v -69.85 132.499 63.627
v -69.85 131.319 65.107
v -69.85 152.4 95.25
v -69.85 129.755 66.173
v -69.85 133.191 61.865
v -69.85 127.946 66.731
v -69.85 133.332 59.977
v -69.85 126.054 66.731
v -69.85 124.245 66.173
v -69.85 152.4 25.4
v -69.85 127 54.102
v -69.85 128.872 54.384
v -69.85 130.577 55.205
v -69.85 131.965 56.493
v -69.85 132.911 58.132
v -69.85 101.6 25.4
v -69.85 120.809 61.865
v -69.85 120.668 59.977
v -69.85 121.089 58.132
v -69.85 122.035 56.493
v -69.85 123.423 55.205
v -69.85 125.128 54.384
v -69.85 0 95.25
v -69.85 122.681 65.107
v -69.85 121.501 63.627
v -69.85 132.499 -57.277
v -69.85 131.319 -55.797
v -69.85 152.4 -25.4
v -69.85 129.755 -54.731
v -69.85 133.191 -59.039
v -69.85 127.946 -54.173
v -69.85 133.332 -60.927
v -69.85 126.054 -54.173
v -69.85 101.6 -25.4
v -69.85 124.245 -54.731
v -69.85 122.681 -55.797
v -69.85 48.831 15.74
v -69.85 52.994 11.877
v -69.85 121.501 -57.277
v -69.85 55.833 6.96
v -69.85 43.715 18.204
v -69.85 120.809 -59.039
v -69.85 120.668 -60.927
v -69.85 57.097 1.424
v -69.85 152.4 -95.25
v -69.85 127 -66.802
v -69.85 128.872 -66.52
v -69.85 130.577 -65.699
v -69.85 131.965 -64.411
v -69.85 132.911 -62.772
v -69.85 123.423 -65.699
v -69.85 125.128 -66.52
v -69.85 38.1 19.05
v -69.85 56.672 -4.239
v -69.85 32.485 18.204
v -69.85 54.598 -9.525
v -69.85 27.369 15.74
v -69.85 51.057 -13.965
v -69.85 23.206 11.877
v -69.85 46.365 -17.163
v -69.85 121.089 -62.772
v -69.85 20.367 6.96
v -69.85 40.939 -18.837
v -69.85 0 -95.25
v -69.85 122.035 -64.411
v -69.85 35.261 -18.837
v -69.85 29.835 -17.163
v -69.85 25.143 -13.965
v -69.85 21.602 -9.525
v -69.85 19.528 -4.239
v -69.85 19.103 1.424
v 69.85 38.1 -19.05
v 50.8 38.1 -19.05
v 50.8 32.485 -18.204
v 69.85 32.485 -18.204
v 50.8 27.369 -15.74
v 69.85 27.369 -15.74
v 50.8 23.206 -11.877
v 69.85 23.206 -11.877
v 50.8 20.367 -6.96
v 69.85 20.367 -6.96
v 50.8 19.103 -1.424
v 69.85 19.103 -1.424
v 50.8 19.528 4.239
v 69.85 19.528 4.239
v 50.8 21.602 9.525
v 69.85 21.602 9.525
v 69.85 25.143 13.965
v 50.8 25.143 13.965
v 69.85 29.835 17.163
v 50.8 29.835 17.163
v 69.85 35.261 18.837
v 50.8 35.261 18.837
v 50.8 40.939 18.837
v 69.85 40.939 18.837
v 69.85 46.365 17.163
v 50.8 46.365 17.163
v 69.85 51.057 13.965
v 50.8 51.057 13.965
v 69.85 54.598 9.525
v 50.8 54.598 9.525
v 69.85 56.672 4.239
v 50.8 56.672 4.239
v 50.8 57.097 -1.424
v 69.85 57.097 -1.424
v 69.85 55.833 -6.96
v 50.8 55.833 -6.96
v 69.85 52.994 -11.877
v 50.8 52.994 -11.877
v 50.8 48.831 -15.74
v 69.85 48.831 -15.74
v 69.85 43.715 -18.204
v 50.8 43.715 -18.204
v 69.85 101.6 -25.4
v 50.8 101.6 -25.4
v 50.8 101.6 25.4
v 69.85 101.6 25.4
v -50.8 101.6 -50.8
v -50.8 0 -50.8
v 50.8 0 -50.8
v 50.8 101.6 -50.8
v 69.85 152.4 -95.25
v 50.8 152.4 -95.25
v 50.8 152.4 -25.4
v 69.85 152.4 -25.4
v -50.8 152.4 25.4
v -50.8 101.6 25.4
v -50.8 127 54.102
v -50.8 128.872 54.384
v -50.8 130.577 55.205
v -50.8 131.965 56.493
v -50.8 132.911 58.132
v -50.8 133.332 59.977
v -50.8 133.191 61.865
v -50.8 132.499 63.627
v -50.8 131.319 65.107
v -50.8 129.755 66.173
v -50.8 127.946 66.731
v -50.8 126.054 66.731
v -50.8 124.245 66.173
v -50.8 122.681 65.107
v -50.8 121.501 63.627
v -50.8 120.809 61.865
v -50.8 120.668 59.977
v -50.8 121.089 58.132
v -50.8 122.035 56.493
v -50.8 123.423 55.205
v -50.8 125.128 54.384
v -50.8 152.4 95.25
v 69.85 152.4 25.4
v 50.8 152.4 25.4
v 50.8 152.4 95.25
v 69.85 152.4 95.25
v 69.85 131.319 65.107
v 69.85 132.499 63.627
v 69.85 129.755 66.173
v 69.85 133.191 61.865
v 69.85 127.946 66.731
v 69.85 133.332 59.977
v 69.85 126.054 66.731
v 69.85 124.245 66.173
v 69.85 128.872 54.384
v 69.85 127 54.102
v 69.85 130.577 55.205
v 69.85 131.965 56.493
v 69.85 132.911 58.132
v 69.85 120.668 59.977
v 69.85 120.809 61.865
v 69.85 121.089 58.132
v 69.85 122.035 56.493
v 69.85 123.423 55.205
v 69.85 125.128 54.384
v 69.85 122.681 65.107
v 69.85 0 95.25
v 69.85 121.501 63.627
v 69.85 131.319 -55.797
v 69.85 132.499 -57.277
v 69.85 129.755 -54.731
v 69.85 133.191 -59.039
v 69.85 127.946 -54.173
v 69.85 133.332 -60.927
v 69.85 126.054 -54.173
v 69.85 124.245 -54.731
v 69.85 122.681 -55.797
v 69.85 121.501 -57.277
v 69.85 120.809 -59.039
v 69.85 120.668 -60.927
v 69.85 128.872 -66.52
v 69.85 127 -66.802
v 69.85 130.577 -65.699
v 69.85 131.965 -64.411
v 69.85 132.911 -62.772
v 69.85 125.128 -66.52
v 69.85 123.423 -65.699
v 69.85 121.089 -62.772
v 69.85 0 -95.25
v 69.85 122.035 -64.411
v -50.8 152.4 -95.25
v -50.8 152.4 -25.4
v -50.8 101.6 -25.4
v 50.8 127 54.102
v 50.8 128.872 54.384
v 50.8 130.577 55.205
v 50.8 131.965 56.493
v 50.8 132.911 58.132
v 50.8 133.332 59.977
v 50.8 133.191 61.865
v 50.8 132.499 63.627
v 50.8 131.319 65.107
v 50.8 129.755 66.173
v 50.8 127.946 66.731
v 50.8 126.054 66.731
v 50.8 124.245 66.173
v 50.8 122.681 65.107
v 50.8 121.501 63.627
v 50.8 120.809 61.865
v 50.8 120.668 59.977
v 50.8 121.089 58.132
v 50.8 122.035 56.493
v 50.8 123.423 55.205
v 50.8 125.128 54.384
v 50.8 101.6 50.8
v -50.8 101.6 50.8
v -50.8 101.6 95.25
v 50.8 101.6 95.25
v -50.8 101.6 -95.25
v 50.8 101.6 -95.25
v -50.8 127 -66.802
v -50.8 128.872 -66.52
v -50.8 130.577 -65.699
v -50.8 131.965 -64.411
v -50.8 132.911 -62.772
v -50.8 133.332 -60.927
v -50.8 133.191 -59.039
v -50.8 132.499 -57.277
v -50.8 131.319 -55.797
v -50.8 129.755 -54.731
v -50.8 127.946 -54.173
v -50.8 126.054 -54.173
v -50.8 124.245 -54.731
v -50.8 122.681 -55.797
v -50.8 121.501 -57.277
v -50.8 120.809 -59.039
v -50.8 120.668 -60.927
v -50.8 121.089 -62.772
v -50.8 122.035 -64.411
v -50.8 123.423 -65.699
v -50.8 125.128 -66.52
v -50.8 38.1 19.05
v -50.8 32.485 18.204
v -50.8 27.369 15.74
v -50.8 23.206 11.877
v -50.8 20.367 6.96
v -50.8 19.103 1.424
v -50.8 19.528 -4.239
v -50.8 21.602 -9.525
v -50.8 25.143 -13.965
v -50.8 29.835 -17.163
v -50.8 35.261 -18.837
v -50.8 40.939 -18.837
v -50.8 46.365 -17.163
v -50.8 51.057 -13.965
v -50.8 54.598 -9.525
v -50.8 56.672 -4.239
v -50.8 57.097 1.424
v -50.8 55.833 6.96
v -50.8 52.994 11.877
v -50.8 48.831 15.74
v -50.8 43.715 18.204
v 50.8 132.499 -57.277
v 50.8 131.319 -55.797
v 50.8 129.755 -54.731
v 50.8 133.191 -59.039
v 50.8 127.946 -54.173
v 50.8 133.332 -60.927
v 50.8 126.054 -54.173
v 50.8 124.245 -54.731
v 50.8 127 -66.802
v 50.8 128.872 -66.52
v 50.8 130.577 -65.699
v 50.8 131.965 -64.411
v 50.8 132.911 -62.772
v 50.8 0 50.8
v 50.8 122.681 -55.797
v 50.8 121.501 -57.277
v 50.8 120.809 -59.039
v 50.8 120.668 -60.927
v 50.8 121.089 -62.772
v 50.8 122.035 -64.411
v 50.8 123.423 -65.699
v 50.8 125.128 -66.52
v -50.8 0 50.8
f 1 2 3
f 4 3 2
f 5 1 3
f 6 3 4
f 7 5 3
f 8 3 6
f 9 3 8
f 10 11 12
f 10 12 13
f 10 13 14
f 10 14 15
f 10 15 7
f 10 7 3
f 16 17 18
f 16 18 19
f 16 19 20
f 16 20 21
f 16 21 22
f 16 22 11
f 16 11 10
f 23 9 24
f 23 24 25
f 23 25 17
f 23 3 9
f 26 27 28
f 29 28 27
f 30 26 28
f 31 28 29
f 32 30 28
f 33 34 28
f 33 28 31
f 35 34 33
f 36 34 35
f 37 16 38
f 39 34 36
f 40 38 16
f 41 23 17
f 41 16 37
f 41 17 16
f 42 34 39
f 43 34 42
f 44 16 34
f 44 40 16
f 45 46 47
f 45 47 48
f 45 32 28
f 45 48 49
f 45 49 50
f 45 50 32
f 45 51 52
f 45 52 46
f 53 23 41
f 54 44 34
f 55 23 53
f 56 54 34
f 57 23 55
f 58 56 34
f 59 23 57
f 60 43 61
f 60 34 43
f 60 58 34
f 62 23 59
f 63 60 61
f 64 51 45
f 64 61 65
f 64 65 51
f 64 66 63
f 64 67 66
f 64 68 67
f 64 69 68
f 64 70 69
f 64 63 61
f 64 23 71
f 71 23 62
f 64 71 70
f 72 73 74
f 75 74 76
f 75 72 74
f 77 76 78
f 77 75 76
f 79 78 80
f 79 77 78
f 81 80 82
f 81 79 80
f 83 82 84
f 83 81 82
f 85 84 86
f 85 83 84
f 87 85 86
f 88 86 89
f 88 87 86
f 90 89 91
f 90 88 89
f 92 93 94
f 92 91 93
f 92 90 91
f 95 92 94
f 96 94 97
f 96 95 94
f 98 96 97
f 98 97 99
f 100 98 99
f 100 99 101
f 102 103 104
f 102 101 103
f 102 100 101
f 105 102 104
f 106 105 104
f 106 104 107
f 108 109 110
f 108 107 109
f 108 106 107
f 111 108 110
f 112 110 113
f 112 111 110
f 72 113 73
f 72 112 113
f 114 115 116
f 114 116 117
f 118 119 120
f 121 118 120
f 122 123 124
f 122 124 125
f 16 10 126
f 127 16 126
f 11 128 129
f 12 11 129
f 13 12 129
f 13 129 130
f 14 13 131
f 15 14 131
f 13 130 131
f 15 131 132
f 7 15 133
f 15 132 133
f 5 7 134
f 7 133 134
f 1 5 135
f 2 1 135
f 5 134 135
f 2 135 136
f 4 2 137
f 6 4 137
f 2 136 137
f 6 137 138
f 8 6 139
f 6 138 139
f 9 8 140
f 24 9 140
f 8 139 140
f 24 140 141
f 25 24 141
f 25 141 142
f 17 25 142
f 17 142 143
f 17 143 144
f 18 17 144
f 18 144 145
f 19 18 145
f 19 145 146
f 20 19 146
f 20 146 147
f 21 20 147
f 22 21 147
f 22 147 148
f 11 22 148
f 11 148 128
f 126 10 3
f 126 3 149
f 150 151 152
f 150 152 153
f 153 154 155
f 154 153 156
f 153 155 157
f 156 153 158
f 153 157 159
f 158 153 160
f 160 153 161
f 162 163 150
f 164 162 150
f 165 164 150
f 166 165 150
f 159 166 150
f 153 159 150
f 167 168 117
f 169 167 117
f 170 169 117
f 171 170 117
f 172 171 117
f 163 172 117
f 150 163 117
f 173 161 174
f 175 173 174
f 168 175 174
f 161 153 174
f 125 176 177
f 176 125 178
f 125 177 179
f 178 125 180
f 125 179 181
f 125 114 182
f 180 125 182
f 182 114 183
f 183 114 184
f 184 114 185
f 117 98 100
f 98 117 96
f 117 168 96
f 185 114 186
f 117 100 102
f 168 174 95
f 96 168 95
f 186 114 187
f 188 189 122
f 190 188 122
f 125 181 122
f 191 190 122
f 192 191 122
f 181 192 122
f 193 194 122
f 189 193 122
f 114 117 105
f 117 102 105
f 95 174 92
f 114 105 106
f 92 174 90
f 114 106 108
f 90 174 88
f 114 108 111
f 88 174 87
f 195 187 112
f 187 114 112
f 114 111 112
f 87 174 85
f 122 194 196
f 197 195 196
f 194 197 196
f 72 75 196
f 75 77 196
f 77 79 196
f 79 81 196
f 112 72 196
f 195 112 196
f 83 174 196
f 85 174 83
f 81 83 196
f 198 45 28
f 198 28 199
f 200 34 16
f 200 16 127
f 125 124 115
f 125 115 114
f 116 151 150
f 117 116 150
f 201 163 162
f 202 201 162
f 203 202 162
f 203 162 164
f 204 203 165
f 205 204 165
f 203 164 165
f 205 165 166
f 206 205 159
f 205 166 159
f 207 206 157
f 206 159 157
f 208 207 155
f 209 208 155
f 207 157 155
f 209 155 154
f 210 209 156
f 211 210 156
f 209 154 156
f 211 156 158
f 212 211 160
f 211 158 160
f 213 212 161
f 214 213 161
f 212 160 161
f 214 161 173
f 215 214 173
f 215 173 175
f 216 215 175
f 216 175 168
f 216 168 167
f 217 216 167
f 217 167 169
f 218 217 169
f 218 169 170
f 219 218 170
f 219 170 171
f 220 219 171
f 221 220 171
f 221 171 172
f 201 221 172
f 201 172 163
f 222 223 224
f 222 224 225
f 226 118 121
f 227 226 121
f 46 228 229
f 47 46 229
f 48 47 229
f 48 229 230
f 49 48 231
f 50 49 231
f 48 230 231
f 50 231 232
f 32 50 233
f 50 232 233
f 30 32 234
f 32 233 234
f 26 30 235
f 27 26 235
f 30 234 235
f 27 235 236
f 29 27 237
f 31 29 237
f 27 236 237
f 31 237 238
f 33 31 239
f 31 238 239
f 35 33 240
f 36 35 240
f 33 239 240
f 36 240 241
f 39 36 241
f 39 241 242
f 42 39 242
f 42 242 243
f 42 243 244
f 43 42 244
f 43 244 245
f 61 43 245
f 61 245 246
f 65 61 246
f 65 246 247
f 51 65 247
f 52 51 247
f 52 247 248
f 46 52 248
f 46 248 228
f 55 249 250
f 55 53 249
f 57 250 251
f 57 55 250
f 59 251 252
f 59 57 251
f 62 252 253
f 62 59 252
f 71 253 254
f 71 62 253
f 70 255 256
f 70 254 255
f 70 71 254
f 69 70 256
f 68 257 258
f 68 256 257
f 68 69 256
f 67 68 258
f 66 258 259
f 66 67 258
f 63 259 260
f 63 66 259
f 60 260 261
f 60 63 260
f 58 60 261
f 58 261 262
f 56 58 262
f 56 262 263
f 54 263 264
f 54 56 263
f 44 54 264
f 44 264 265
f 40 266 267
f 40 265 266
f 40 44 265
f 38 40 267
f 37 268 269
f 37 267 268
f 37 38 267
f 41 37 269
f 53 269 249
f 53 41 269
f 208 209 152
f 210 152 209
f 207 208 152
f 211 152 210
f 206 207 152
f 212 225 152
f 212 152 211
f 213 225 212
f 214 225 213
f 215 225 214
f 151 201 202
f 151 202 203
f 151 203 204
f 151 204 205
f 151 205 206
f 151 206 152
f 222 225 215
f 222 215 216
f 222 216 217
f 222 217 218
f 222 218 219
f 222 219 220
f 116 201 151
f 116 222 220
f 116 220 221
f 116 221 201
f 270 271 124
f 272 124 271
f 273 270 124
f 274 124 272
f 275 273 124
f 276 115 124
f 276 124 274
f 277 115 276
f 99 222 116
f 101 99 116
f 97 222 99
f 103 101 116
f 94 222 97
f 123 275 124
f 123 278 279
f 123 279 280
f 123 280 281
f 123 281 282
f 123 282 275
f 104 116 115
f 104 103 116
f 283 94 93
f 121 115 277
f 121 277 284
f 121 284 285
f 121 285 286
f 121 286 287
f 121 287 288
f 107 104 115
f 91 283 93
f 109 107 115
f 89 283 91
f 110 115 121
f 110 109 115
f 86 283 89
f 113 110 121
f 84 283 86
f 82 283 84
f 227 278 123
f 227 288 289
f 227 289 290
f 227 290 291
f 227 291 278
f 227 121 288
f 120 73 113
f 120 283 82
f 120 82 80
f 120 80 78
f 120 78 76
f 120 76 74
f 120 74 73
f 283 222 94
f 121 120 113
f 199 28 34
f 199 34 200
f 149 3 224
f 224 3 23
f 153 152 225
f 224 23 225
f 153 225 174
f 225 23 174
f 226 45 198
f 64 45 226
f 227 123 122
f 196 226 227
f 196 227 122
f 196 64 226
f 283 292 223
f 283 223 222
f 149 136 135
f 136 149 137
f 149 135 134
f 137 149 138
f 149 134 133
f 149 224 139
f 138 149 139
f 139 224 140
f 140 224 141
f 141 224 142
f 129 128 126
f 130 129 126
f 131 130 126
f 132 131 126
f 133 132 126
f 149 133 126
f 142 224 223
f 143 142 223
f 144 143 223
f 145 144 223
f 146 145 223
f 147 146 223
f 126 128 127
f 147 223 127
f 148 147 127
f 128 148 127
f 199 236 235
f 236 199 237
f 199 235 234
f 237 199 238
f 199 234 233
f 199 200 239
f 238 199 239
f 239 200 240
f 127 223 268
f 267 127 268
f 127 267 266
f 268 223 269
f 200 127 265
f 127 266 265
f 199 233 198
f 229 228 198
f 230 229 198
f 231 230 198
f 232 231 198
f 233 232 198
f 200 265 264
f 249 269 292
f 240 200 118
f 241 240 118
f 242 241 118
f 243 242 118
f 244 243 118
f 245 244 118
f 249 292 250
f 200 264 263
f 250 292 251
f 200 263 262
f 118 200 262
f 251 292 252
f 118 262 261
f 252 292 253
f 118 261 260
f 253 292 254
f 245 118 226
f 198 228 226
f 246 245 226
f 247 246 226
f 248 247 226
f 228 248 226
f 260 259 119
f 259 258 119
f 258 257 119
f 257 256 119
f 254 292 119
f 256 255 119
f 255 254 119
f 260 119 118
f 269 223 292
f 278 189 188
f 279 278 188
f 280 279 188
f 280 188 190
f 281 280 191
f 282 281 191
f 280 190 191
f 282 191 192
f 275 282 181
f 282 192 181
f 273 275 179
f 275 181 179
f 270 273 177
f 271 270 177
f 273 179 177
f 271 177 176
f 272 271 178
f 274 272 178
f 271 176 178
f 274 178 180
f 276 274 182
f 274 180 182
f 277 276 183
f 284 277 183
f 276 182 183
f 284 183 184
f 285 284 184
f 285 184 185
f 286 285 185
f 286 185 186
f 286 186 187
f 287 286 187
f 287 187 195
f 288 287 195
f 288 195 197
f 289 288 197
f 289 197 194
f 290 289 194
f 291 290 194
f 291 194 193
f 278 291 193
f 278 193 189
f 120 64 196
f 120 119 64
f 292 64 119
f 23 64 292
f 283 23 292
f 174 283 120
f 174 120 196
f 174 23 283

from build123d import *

# Parameters (mm, degrees)
SKETCH1_W               = 139.7
SKETCH1_H               = 190.5
SKETCH1_W_2             = 101.6
SKETCH1_H_2             = 152.4
EXTRUDE_THIN1_DEPTH     = 152.4
CUT_EXTRUDE1_START      = -50.8
SKETCH2_W               = 101.6
SKETCH2_H               = 19.05
CUT_EXTRUDE1_DEPTH      = 50.8
SKETCH5_W               = 101.6
SKETCH5_H               = 50.8
CUT_EXTRUDE5_DEPTH      = 190.5
CUT_EXTRUDE6_DEPTH      = 228.627793777
CUT_EXTRUDE6_DEPTH_BACK = 228.627793777
SKETCH6_R               = 19.05
SKETCH7_R               = 6.35
CUT_EXTRUDE8_DEPTH      = 228.627793777
CUT_EXTRUDE2_START      = -101.6
SKETCH3_W               = 19.05
SKETCH3_H               = 127
CUT_EXTRUDE2_DEPTH      = 101.6
SKETCH4_W               = 367.241731945
SKETCH4_H               = 189.529563026
CUT_EXTRUDE4_DEPTH      = 142.24
SKETCH8_W               = 171.45
SKETCH8_H               = 101.6
BOSS_EXTRUDE1_DEPTH     = 19.05
CUT_EXTRUDE9_DEPTH      = 228.627793777
CUT_EXTRUDE9_DEPTH_BACK = 228.627793777
SKETCH9_R               = 19.05
SKETCH10_W              = 101.6
SKETCH10_H              = 25.4
BOSS_EXTRUDE2_DEPTH     = 101.6
SKETCH11_W              = 139.7
SKETCH11_H              = 50.8
CUT_EXTRUDE10_DEPTH     = 50.8


with BuildPart() as part:
    # Sketch1 → Extrude-Thin1 (new body)
    with BuildSketch(Plane(origin=(0, 0, 0), x_dir=(1, 0, 0), z_dir=(0, 1, 0))):
        Rectangle(SKETCH1_W, SKETCH1_H)
        Rectangle(SKETCH1_W_2, SKETCH1_H_2, mode=Mode.SUBTRACT)
    extrude(amount=EXTRUDE_THIN1_DEPTH)

    # Sketch2 → Cut-Extrude1 (cut)
    with BuildSketch(Plane(origin=(0, 152.4, 0), x_dir=(1, 0, 0), z_dir=(0, 1, 0)).offset(CUT_EXTRUDE1_START)):
        with Locations((0, -85.725)):
            Rectangle(SKETCH2_W, SKETCH2_H)
    extrude(amount=CUT_EXTRUDE1_DEPTH, mode=Mode.SUBTRACT)

    # Sketch5 → Cut-Extrude5 (cut)
    with BuildSketch(Plane.XY.offset(95.25)):
        with Locations((0, 127)):
            Rectangle(SKETCH5_W, SKETCH5_H)
    extrude(amount=-CUT_EXTRUDE5_DEPTH, mode=Mode.SUBTRACT)

    # Sketch6 → Cut-Extrude6 (cut, two sides: drawn at the far end of the back side and taken through both)
    with BuildSketch(Plane.ZY.offset(69.85).offset(-CUT_EXTRUDE6_DEPTH_BACK)):
        with Locations(Location((0, 38.1, 0), (0, 0, 180))):
            Circle(SKETCH6_R)
    extrude(amount=CUT_EXTRUDE6_DEPTH + CUT_EXTRUDE6_DEPTH_BACK, mode=Mode.SUBTRACT)

    # Sketch7 → Cut-Extrude8 (cut, through all)
    with BuildSketch(Plane(origin=(69.85, 0, 0), x_dir=(0, 0, -1), z_dir=(1, 0, 0))):
        with Locations((-60.452, 127)):
            Circle(SKETCH7_R)
        with Locations((60.452, 127)):
            Circle(SKETCH7_R)
    extrude(amount=-CUT_EXTRUDE8_DEPTH, mode=Mode.SUBTRACT)

    # Sketch3 → Cut-Extrude2 (cut)
    with BuildSketch(Plane.XZ.offset(CUT_EXTRUDE2_START)):
        with Locations((-60.325, 12.7)):
            Rectangle(SKETCH3_W, SKETCH3_H)
    extrude(amount=CUT_EXTRUDE2_DEPTH, mode=Mode.SUBTRACT)


with BuildPart() as body_2:
    # Mirror2: mirrored copy
    add(part.part.mirror(Plane(origin=(72.39, 0, 0), x_dir=(0, 0, 1), z_dir=(1, 0, 0))))

    # Sketch4 → Cut-Extrude4 (cut)
    with BuildSketch(Plane(origin=(72.39, 0, 0), x_dir=(0, 0, -1), z_dir=(1, 0, 0))):
        with Locations((39.035224398, 57.635218487)):
            Rectangle(SKETCH4_W, SKETCH4_H)
    extrude(amount=CUT_EXTRUDE4_DEPTH, mode=Mode.SUBTRACT)


with BuildPart() as part_1:
    add(part.part)

    # Sketch8 → Boss-Extrude1 (add)
    with BuildSketch(Plane.ZY.offset(69.85)):
        with Locations((-9.525, 50.8)):
            Rectangle(SKETCH8_W, SKETCH8_H)
    extrude(amount=-BOSS_EXTRUDE1_DEPTH)

    # Sketch9 → Cut-Extrude9 (cut, two sides: drawn at the far end of the back side and taken through both)
    with BuildSketch(Plane(origin=(69.85, 0, 0), x_dir=(0, 0, -1), z_dir=(1, 0, 0)).offset(-CUT_EXTRUDE9_DEPTH_BACK)):
        with Locations(Location((0, 38.1, 0), (0, 0, 180))):
            Circle(SKETCH9_R)
    extrude(amount=CUT_EXTRUDE9_DEPTH + CUT_EXTRUDE9_DEPTH_BACK, mode=Mode.SUBTRACT)

    # Sketch10 → Boss-Extrude2 (add)
    with BuildSketch(Plane.XZ):
        with Locations((0, -63.5)):
            Rectangle(SKETCH10_W, SKETCH10_H)
        with Locations((0, 63.5)):
            Rectangle(SKETCH10_W, SKETCH10_H)
    extrude(amount=-BOSS_EXTRUDE2_DEPTH)

    # Sketch11 → Cut-Extrude10 (cut)
    with BuildSketch(Plane(origin=(0, 152.4, 0), x_dir=(1, 0, 0), z_dir=(0, 1, 0))):
        Rectangle(SKETCH11_W, SKETCH11_H)
    extrude(amount=-CUT_EXTRUDE10_DEPTH, mode=Mode.SUBTRACT)


solid = part_1.part
